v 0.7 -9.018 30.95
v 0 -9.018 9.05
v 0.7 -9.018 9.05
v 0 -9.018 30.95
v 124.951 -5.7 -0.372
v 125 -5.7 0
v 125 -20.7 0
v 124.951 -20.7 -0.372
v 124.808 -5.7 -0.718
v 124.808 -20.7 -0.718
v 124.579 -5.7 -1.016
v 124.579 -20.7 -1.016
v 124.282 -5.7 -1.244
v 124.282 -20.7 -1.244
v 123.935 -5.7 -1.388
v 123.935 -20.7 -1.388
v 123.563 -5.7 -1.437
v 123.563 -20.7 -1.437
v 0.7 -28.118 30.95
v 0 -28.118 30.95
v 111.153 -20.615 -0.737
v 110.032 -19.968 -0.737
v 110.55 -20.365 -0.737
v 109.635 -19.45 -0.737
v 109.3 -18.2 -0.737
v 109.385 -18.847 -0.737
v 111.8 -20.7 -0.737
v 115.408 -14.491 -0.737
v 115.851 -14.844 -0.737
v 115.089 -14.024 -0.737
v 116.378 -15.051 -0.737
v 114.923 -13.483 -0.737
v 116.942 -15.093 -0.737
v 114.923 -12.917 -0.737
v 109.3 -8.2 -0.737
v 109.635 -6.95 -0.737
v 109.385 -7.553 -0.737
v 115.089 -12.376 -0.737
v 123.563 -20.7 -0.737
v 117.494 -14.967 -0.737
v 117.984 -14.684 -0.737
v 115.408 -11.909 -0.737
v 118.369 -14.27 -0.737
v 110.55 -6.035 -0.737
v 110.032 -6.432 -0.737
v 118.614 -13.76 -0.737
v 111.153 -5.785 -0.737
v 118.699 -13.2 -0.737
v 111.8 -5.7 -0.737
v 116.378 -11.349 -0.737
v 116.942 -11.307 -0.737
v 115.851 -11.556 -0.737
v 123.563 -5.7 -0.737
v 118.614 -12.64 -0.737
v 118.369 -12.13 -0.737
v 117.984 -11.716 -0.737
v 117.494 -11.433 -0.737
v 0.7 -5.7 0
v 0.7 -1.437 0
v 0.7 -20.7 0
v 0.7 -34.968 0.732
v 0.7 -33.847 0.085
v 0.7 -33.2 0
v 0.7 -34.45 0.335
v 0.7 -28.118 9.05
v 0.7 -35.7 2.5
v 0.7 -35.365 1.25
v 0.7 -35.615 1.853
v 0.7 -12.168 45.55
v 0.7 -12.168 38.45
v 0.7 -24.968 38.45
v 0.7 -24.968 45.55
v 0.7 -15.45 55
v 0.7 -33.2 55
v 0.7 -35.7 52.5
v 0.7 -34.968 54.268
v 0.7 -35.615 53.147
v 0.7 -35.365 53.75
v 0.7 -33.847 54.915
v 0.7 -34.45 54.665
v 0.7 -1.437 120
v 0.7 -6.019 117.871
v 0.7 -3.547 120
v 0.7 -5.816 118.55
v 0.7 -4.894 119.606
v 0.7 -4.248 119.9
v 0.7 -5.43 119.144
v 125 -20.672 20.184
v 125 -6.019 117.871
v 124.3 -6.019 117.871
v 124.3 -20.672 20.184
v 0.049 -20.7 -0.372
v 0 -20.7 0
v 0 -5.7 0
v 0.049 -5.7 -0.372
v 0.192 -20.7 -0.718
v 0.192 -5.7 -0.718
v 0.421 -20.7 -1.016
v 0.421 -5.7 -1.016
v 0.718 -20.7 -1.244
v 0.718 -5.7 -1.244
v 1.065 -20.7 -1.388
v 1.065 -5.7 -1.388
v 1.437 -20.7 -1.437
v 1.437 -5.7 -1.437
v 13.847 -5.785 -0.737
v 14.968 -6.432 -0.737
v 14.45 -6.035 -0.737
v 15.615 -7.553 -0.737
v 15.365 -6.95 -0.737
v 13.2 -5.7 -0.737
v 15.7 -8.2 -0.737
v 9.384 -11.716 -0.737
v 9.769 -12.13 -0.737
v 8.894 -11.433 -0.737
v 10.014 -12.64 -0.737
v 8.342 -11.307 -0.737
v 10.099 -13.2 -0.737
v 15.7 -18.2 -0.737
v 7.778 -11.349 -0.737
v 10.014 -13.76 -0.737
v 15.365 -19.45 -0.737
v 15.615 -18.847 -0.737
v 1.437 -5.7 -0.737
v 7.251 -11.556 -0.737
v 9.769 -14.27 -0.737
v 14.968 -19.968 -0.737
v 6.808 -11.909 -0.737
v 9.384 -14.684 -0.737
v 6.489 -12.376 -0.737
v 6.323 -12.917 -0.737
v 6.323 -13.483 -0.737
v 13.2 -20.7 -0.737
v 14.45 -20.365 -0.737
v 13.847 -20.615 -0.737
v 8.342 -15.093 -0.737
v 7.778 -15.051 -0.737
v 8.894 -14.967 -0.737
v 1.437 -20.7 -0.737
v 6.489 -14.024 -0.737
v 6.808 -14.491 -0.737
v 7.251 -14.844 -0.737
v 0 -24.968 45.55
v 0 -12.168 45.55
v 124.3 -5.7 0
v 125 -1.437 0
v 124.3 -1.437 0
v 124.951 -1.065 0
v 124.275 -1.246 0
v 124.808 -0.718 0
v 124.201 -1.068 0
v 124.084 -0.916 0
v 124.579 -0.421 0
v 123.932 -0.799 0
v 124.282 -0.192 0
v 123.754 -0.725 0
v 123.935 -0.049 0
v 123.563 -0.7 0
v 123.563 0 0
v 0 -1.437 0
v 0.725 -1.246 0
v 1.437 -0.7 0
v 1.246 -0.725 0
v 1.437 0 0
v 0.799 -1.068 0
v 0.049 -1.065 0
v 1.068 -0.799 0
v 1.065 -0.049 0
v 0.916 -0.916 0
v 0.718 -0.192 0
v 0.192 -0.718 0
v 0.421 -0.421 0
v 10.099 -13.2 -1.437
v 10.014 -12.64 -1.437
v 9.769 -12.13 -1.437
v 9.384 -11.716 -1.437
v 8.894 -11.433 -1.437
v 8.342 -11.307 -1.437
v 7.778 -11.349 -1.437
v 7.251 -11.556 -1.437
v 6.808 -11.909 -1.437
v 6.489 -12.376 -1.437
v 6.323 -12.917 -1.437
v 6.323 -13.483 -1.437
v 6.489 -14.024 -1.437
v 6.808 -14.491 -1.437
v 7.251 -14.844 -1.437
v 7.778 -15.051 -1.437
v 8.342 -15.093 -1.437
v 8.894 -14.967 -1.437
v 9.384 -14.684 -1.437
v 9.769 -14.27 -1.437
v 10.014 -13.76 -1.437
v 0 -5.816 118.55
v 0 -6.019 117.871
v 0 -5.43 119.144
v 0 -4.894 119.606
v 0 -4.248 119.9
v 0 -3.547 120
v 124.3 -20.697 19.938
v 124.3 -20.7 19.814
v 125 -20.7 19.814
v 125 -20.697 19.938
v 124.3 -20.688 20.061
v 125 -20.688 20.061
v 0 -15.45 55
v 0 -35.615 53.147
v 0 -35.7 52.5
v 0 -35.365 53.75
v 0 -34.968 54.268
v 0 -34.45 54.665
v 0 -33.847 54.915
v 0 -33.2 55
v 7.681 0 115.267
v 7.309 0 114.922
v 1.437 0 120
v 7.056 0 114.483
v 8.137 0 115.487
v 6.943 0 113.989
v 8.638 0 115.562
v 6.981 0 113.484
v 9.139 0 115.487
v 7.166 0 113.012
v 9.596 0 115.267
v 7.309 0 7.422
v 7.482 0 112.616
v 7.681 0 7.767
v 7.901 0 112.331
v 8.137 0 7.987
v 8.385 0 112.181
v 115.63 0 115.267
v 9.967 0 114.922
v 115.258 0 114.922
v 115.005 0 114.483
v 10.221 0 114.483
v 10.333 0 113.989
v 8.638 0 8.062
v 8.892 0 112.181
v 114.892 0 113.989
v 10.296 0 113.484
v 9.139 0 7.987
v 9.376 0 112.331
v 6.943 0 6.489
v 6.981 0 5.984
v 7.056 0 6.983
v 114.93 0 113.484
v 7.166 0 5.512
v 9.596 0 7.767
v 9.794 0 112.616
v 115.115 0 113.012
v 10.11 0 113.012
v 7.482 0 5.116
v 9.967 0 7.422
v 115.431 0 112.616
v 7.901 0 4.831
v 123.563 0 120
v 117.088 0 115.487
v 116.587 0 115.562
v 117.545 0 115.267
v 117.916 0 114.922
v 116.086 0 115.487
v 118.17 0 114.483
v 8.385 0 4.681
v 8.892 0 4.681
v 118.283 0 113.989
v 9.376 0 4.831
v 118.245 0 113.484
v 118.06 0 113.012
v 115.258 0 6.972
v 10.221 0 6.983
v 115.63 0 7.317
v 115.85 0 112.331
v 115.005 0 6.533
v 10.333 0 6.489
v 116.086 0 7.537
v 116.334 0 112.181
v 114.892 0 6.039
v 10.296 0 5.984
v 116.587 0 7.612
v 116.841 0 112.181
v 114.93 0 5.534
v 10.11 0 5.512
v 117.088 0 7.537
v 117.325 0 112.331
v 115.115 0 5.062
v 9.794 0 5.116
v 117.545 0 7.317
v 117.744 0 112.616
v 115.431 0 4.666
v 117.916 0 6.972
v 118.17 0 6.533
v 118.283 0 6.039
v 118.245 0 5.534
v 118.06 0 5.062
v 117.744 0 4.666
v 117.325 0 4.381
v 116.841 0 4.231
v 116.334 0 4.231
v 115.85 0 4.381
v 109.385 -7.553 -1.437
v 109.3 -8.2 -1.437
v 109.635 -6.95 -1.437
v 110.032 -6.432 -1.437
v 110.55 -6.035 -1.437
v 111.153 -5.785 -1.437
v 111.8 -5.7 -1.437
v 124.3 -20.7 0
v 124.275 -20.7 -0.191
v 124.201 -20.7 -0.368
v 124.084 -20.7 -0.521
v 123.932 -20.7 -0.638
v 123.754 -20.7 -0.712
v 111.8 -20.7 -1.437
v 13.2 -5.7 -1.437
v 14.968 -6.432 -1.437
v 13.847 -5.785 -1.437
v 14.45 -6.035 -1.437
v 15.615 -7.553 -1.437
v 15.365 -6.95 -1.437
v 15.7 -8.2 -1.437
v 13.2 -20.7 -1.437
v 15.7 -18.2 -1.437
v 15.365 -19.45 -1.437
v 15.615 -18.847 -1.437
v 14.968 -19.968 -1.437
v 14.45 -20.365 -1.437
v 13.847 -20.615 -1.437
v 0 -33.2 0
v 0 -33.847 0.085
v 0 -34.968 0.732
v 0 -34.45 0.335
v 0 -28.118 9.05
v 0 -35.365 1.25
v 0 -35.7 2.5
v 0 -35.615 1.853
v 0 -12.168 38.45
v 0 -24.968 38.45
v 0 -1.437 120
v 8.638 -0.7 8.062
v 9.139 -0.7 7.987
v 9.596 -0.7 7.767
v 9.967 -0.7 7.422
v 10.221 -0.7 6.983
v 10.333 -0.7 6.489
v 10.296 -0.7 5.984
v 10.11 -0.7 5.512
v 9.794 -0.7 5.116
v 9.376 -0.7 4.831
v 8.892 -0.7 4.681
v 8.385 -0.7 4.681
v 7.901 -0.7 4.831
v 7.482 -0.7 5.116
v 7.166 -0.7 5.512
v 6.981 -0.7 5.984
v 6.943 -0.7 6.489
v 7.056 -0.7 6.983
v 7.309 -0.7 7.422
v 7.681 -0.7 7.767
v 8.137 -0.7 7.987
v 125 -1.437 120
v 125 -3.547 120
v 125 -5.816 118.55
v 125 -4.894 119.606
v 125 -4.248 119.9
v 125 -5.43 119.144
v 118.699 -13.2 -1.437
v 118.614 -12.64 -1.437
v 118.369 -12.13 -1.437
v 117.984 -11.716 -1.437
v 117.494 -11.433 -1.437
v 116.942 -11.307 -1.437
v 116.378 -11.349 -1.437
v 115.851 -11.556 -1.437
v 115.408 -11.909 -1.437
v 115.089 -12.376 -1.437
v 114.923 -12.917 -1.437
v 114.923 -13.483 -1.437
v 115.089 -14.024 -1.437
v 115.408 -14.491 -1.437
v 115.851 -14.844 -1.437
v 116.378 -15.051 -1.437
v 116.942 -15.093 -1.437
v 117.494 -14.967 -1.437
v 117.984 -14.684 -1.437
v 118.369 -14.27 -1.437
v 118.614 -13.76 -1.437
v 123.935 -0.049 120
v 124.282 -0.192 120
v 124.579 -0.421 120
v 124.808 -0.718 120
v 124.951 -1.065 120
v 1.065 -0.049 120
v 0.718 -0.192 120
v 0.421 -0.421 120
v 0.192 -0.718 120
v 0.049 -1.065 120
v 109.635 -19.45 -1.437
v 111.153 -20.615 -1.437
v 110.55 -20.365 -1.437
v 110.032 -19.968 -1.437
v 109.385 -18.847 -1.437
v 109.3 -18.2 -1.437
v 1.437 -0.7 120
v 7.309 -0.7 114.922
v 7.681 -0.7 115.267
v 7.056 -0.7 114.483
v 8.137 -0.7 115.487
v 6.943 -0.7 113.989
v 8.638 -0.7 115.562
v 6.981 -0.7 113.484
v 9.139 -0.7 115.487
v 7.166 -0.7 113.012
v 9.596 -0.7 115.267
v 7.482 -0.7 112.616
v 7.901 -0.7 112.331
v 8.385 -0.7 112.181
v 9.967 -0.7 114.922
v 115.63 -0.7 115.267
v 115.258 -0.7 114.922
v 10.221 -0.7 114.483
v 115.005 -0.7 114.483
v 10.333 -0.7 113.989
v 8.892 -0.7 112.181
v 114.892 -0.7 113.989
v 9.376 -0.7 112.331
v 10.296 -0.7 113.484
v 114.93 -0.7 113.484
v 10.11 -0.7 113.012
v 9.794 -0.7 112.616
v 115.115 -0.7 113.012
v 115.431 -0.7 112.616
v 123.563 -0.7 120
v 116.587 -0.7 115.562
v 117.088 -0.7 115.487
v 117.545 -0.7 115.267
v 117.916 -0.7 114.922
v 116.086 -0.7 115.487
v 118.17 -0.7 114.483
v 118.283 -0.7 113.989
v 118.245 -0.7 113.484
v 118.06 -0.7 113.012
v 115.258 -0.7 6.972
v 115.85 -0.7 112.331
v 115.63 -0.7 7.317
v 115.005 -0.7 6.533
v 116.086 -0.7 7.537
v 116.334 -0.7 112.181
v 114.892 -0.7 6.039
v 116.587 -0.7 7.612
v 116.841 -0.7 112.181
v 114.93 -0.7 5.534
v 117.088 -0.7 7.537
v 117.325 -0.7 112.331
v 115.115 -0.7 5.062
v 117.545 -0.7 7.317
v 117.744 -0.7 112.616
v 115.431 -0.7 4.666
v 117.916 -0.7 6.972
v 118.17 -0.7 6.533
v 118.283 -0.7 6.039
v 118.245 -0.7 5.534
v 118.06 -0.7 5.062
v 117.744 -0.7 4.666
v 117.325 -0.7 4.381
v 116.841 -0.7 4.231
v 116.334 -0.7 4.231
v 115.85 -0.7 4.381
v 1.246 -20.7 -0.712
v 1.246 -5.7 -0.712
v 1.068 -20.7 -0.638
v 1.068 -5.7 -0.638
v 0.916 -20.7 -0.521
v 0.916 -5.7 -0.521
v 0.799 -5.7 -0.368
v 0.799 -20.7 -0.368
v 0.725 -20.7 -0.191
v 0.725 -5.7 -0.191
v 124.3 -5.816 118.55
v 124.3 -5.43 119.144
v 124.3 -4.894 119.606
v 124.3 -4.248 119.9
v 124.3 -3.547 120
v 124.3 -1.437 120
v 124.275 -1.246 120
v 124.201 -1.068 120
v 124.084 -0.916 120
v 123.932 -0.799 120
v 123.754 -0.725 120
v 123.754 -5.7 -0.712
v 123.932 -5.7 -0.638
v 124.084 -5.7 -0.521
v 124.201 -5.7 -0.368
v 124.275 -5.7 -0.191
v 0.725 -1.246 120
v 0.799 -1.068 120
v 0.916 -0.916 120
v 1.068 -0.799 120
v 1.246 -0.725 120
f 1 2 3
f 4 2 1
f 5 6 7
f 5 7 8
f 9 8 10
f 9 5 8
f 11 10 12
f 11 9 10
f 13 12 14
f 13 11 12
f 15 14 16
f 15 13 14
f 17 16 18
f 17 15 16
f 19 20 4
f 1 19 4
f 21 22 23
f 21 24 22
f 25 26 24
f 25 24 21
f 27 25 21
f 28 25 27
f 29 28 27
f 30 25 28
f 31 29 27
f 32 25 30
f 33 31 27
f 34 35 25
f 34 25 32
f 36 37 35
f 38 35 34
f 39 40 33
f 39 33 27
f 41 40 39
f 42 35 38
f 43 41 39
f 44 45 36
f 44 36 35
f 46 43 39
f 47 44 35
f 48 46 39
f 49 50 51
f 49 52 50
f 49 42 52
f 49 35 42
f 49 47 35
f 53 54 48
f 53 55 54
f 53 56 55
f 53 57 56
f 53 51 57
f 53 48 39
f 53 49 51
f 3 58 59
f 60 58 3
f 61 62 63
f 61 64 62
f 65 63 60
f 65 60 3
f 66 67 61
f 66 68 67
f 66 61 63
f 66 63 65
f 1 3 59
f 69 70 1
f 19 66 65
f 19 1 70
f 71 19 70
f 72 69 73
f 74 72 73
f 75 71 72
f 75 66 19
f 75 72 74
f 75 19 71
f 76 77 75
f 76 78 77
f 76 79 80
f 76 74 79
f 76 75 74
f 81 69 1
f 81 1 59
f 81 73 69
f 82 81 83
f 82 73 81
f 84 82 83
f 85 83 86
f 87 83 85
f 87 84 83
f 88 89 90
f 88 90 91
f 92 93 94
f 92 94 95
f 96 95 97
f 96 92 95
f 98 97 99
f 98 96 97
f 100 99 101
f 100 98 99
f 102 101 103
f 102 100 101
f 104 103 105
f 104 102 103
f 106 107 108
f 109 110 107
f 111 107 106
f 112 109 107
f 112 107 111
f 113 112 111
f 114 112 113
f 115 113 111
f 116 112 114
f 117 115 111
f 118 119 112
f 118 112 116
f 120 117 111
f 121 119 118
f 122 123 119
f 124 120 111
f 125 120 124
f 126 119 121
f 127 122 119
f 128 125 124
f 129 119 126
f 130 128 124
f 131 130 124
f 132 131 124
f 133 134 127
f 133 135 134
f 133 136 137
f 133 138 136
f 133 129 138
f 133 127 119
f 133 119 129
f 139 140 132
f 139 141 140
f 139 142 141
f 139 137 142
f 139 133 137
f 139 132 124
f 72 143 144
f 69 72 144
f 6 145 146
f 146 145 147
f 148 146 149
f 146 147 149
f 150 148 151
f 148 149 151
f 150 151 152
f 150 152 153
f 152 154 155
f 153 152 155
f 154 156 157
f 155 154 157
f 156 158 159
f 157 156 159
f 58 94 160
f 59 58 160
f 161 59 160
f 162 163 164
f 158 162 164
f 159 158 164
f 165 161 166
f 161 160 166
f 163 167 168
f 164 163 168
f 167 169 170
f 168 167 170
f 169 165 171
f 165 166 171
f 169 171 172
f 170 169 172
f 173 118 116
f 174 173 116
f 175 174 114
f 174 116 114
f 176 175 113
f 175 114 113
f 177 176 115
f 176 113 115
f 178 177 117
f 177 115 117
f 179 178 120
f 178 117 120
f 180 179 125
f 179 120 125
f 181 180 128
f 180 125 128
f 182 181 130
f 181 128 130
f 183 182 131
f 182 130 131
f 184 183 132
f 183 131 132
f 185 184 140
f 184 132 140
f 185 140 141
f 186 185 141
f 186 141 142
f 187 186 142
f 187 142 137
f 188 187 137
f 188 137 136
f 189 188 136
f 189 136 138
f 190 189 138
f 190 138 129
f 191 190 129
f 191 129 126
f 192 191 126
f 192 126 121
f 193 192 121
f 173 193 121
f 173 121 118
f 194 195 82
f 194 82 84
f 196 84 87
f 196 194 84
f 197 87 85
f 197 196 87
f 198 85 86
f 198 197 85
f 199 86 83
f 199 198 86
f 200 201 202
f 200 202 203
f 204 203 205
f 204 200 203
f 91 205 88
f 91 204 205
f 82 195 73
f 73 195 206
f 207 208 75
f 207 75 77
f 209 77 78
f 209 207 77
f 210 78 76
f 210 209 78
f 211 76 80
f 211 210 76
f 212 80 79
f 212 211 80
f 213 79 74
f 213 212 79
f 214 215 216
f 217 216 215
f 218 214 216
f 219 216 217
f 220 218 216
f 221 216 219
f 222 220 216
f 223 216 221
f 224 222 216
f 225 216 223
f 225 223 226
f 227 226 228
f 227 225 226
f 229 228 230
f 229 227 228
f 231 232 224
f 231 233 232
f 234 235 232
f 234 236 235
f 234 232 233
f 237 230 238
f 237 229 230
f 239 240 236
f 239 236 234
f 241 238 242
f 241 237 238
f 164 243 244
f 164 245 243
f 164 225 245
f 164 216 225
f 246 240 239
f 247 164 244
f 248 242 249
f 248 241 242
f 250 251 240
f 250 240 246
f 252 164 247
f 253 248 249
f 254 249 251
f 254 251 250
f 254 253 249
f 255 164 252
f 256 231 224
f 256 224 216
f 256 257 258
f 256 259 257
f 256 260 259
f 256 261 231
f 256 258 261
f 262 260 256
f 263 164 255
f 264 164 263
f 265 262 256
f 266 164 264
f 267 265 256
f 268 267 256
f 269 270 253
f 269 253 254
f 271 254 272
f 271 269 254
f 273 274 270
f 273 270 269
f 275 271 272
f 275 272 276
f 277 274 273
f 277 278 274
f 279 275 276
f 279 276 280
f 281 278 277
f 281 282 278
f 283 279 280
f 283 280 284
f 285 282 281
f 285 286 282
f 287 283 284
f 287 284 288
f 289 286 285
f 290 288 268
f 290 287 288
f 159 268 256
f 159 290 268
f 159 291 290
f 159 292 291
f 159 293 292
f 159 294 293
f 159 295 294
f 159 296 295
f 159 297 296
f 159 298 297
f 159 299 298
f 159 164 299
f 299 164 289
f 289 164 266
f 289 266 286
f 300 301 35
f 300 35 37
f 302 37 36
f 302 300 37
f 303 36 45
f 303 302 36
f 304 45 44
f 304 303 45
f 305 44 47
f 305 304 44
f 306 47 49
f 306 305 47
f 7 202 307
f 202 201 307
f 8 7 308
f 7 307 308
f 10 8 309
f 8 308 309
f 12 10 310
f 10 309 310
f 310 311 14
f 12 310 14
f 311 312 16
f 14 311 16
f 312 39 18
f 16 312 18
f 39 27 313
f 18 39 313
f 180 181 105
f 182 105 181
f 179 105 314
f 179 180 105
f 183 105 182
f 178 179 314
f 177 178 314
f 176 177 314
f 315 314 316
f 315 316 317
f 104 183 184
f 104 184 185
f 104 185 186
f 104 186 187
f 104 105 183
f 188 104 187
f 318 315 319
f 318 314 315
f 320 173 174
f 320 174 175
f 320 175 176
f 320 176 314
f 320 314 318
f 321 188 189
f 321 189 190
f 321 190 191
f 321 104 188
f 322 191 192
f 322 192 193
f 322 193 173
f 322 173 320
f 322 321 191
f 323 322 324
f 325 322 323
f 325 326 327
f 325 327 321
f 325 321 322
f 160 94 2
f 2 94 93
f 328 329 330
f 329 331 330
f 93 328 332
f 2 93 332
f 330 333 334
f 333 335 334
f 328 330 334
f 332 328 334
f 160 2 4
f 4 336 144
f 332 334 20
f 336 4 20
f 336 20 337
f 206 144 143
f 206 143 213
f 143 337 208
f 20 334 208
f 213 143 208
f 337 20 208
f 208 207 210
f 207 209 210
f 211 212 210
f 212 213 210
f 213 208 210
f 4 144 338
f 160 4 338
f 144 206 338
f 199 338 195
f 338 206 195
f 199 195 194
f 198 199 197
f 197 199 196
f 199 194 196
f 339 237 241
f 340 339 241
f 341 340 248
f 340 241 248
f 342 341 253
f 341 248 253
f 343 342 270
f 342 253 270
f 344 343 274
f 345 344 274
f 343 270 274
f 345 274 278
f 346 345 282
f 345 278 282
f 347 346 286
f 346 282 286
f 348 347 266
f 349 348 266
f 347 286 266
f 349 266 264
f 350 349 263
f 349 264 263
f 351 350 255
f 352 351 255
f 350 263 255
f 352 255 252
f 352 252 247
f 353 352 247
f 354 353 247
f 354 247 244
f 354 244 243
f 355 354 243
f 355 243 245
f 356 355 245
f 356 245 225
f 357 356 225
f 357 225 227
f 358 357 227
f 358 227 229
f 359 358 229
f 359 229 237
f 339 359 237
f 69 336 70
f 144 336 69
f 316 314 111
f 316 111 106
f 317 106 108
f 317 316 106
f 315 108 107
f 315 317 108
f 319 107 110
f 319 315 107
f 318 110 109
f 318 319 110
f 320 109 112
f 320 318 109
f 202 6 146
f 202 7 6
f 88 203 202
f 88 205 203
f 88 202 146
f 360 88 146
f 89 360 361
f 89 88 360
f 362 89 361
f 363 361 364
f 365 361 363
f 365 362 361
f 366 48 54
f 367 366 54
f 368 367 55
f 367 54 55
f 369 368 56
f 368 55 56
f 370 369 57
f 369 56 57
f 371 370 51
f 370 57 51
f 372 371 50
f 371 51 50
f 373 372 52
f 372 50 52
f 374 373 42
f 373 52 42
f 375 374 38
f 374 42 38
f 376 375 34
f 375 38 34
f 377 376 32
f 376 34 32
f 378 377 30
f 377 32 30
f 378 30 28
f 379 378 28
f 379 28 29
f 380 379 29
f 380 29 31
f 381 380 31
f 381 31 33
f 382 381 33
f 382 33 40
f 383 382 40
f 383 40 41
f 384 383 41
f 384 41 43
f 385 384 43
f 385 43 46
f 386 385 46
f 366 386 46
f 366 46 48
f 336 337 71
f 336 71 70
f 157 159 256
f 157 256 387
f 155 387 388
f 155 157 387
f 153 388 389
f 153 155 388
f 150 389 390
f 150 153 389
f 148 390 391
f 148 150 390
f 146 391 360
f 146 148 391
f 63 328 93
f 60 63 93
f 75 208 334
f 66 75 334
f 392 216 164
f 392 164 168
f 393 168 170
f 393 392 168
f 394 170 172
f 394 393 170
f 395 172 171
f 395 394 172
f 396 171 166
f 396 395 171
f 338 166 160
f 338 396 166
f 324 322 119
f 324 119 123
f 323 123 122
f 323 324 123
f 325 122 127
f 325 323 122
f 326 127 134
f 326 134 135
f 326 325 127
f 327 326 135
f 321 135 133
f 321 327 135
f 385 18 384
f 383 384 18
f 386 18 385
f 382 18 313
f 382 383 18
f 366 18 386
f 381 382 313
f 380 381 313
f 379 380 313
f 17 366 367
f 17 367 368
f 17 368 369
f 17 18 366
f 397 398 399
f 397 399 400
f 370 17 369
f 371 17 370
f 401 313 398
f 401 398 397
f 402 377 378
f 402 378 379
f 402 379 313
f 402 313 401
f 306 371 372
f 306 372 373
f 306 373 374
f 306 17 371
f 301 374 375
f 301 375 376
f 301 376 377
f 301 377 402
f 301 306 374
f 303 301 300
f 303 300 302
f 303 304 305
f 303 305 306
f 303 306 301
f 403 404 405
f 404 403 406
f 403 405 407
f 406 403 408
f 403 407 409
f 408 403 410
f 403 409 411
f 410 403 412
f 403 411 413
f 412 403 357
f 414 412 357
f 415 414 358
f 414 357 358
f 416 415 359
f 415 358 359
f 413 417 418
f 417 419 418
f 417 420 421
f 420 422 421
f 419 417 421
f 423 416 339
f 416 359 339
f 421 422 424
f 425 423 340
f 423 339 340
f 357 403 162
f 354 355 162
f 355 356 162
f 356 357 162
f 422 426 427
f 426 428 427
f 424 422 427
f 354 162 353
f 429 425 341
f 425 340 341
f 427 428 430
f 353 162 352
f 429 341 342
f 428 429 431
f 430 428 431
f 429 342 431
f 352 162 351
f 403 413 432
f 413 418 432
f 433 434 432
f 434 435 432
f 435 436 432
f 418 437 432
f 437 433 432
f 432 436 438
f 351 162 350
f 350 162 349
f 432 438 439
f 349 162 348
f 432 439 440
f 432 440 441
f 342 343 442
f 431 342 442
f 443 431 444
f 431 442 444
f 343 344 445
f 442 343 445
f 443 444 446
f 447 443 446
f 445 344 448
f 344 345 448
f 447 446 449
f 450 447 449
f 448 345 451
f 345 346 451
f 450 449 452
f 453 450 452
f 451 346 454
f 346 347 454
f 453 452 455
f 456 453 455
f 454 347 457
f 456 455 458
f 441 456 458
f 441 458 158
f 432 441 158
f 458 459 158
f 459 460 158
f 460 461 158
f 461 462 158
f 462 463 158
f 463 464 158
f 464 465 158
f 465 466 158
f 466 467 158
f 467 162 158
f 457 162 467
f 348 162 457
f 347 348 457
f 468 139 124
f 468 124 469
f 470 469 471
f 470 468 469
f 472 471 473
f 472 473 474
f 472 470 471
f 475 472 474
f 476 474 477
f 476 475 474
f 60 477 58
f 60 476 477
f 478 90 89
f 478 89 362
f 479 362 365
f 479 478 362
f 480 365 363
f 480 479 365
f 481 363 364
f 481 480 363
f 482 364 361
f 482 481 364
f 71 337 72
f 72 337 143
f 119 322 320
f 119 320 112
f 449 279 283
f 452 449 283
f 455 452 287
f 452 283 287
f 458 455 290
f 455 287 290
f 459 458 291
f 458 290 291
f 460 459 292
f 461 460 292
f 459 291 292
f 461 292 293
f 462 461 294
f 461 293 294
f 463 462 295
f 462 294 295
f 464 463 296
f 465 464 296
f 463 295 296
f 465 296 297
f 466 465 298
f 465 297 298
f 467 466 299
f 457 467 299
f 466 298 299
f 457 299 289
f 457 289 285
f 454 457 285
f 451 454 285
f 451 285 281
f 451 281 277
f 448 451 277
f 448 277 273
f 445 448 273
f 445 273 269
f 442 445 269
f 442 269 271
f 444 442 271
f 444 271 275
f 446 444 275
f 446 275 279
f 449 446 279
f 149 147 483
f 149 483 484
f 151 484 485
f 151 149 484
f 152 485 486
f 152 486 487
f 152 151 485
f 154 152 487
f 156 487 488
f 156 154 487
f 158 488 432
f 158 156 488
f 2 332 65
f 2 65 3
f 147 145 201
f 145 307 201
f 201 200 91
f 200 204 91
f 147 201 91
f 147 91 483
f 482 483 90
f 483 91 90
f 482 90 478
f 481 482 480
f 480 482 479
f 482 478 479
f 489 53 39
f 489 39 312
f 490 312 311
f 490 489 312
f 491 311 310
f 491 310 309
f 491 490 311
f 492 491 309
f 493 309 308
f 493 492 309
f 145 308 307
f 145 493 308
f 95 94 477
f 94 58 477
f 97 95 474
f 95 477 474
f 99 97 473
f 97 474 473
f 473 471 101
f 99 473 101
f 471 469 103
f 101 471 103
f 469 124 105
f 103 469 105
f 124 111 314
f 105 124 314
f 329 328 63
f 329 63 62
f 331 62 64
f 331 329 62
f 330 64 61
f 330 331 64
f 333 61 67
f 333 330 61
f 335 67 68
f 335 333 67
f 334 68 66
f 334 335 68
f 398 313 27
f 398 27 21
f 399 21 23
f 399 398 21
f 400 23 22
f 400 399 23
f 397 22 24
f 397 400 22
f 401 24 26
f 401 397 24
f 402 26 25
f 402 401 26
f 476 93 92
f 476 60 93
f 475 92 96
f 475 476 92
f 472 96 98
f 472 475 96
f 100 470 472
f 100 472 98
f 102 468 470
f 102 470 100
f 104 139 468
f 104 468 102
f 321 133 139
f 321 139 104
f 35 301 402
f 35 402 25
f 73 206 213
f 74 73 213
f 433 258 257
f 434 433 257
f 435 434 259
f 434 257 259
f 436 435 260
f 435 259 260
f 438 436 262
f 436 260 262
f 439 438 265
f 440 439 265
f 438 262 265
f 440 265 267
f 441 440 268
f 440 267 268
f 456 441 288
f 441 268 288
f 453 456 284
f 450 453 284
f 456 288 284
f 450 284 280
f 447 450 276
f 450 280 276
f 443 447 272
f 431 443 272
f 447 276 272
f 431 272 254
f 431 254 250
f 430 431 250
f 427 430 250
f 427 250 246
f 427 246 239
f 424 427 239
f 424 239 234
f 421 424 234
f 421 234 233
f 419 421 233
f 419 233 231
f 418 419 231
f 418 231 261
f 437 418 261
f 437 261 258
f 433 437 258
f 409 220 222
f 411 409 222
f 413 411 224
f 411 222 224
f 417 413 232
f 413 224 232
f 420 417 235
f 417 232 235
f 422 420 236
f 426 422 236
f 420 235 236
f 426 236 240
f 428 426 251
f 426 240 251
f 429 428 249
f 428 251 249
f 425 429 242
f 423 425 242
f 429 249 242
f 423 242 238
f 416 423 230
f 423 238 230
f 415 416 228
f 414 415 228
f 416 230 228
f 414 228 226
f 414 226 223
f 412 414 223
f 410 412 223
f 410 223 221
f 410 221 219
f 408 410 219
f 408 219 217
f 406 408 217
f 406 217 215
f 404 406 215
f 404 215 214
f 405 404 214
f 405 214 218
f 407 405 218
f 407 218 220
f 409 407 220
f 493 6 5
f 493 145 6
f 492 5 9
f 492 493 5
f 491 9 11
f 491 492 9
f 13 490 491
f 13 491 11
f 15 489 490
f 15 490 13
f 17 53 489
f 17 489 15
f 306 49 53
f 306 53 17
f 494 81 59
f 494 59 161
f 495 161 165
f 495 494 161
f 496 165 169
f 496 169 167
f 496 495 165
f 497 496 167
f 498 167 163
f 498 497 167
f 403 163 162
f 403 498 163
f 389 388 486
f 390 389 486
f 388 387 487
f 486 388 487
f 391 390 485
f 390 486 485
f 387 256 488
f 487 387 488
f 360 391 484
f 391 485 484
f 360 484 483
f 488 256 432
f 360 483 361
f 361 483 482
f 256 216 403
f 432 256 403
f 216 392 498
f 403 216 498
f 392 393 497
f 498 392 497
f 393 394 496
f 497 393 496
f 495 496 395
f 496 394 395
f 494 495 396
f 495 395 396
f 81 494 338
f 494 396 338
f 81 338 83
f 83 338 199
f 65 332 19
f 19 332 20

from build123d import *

# Parameters (mm, degrees)
SKETCH1_W                    = 125
SKETCH1_H                    = 120
BASE_FLANGE1_DEPTH           = 0.7
EDGE_FLANGE1_STRIP_W         = 4.2732
EDGE_FLANGE1_STRIP_H         = 0.7
EDGE_FLANGE1_STRIP_CUT_DEPTH = 120
EDGE_FLANGE1_DEPTH           = 120
EDGE_FLANGE1_FLAT_DEPTH      = 0.7
EDGE_FLANGE2_STRIP_W         = 4.2732
EDGE_FLANGE2_STRIP_H         = 0.7
EDGE_FLANGE2_STRIP_CUT_DEPTH = 120
EDGE_FLANGE2_DEPTH           = 120
EDGE_FLANGE2_FLAT_DEPTH      = 0.7
SKETCH10_R                   = 1.7
CUT_EXTRUDE1_DEPTH           = 10
EDGE_FLANGE3_DEPTH           = 15
EDGE_FLANGE4_DEPTH           = 15
F_6_CLEARANCE_HOLE1_D        = 3.7973
F_6_CLEARANCE_HOLE1_DEPTH    = 10
F_6_CLEARANCE_HOLE1_TIP      = 1.140824014
BREAK_CORNER1_START          = -1
BREAK_CORNER1_DEPTH          = 127
BREAK_CORNER1_START_2        = 123.5634
BREAK_CORNER1_2_DEPTH        = 2.4366
BREAK_CORNER1_START_3        = -2
BREAK_CORNER1_3_DEPTH        = 2
SKETCH23_W                   = 21.9
SKETCH23_H                   = 19.1
SKETCH23_W_2                 = 7.1
SKETCH23_H_2                 = 12.8
CUT_EXTRUDE2_DEPTH           = 0.7


with BuildPart() as part:
    # Base-Flange1: sheet metal written as solids
    # Sketch1 → Base-Flange1 (new body)
    with BuildSketch(Plane(origin=(0, 0, 0), x_dir=(1, 0, 0), z_dir=(0, 1, 0))):
        with Locations((62.5, -60)):
            Rectangle(SKETCH1_W, SKETCH1_H)
    extrude(amount=-BASE_FLANGE1_DEPTH)

    # Edge-Flange1: sheet metal written as solids
    # Edge-Flange1 strip (on a plane across the edge) → Edge-Flange1 strip cut (cut)
    with BuildSketch(Plane(origin=(125, -0.7, 0), x_dir=(-1, 0, 0), z_dir=(0, 0, 1))):
        with Locations((-0.7, -0.35)):
            Rectangle(EDGE_FLANGE1_STRIP_W, EDGE_FLANGE1_STRIP_H)
    extrude(amount=EDGE_FLANGE1_STRIP_CUT_DEPTH, mode=Mode.SUBTRACT)

    # Edge-Flange1 bend section (on a plane across the edge) → Edge-Flange1 (add)
    with BuildSketch(Plane(origin=(125, -0.7, 0), x_dir=(-1, 0, 0), z_dir=(0, 0, 1))):
        with BuildLine():
            Line((0, 0.7366), (0.7, 0.7366))
            ThreePointArc((0.7, 0.7366), (0.915745145, 0.215745145), (1.4366, 0))
            Line((1.4366, 0), (1.4366, -0.7))
            ThreePointArc((1.4366, -0.7), (0.420770398, -0.279229602), (0, 0.7366))
        make_face()
    extrude(amount=EDGE_FLANGE1_DEPTH)

    # Edge-Flange1 profile (on flange) → Edge-Flange1 flat (add)
    with BuildSketch(Plane(origin=(125, -0.7, 0), x_dir=(0, 0, 1), z_dir=(1, 0, 0))):
        Polygon((120, 0.7366), (120, 5), (20, 20), (0, 20), (0, 0.7366), align=None)
    extrude(amount=-EDGE_FLANGE1_FLAT_DEPTH)

    # Edge-Flange2: sheet metal written as solids
    # Edge-Flange2 strip (on a plane across the edge) → Edge-Flange2 strip cut (cut)
    with BuildSketch(Plane(origin=(0, -0.7, 120), x_dir=(1, 0, 0), z_dir=(0, 0, -1))):
        with Locations((-0.7, -0.35)):
            Rectangle(EDGE_FLANGE2_STRIP_W, EDGE_FLANGE2_STRIP_H)
    extrude(amount=EDGE_FLANGE2_STRIP_CUT_DEPTH, mode=Mode.SUBTRACT)

    # Edge-Flange2 bend section (on a plane across the edge) → Edge-Flange2 (add)
    with BuildSketch(Plane(origin=(0, -0.7, 120), x_dir=(1, 0, 0), z_dir=(0, 0, -1))):
        with BuildLine():
            Line((0, 0.7366), (0.7, 0.7366))
            ThreePointArc((0.7, 0.7366), (0.915745145, 0.215745145), (1.4366, 0))
            Line((1.4366, 0), (1.4366, -0.7))
            ThreePointArc((1.4366, -0.7), (0.420770398, -0.279229602), (0, 0.7366))
        make_face()
    extrude(amount=EDGE_FLANGE2_DEPTH)

    # Edge-Flange2 profile (on flange) → Edge-Flange2 flat (add)
    with BuildSketch(Plane(origin=(0, -0.7, 0), x_dir=(0, 0, 1), z_dir=(1, 0, 0))):
        Polygon((120, 0.7366), (120, 5), (55, 14.75), (55, 35), (0, 35), (0, 20), (0, 0.7366), align=None)
    extrude(amount=EDGE_FLANGE2_FLAT_DEPTH)

    # Sketch10 → Cut-Extrude1 (cut)
    with BuildSketch(Plane(origin=(0, 0, 0), x_dir=(1, 0, 0), z_dir=(0, 1, 0))):
        with Locations(Location((116.587265025, -113.862265027, 0), (0, 0, 270))):
            Circle(SKETCH10_R)
        with Locations(Location((116.587265025, -5.912265027, 0), (0, 0, 270))):
            Circle(SKETCH10_R)
        with Locations(Location((8.638202963, -6.362265027, 0), (0, 0, 270))):
            Circle(SKETCH10_R)
        with Locations(Location((8.638202963, -113.862265027, 0), (0, 0, 270))):
            Circle(SKETCH10_R)
    extrude(amount=-CUT_EXTRUDE1_DEPTH, mode=Mode.SUBTRACT)

    # Edge-Flange3: sheet metal written as solids
    # Edge-Flange3 section (on a plane across the edge) → Edge-Flange3 (add)
    with BuildSketch(Plane(origin=(124.3, -5.7, -0.7366), x_dir=(0, 0, 1), z_dir=(0, -1, 0))):
        with BuildLine():
            Line((-0.7, 0.7366), (-0.7, 15))
            Line((-0.7, 15), (0, 15))
            Line((0, 15), (0, 0.7366))
            ThreePointArc((0, 0.7366), (0.215745145, 0.215745145), (0.7366, 0))
            Line((0.7366, 0), (0.7366, -0.7))
            ThreePointArc((0.7366, -0.7), (-0.279229602, -0.279229602), (-0.7, 0.7366))
        make_face()
    extrude(amount=EDGE_FLANGE3_DEPTH)

    # Edge-Flange4: sheet metal written as solids
    # Edge-Flange4 section (on a plane across the edge) → Edge-Flange4 (add)
    with BuildSketch(Plane(origin=(0.7, -20.7, -0.7366), x_dir=(0, 0, 1), z_dir=(0, 1, 0))):
        with BuildLine():
            Line((-0.7, 0.7366), (-0.7, 15))
            Line((-0.7, 15), (0, 15))
            Line((0, 15), (0, 0.7366))
            ThreePointArc((0, 0.7366), (0.215745145, 0.215745145), (0.7366, 0))
            Line((0.7366, 0), (0.7366, -0.7))
            ThreePointArc((0.7366, -0.7), (-0.279229602, -0.279229602), (-0.7, 0.7366))
        make_face()
    extrude(amount=EDGE_FLANGE4_DEPTH)

    # #6 Clearance Hole1
    with Locations(Plane(origin=(0, 0, -1.4366), x_dir=(-1, 0, 0), z_dir=(0, 0, -1))):
        with Locations((-116.8, -13.2), (-8.2, -13.2)):
            Hole(F_6_CLEARANCE_HOLE1_D / 2, depth=F_6_CLEARANCE_HOLE1_DEPTH)
            with Locations((0, 0, -(F_6_CLEARANCE_HOLE1_DEPTH + F_6_CLEARANCE_HOLE1_TIP / 2))):  # 118° drill point
                Cone(0, F_6_CLEARANCE_HOLE1_D / 2, F_6_CLEARANCE_HOLE1_TIP, mode=Mode.SUBTRACT)

    # Break-Corner1: read off the stored shape, not the designer's step
    # Break-Corner1 outline → Break-Corner1 (cut)
    with BuildSketch(Plane.YZ.offset(BREAK_CORNER1_START)):
        with BuildLine():
            ThreePointArc((-6.01937233, 117.870851132), (-5.178422292, 119.394350526), (-3.547031448, 120))
            Line((-3.547031448, 120), (-5.7, 120))
            Line((-5.7, 120), (-6.01937233, 117.870851132))
        make_face()
        with BuildLine():
            ThreePointArc((-35.7, 52.5), (-34.967766953, 54.267766953), (-33.2, 55))
            Line((-33.2, 55), (-35.7, 55))
            Line((-35.7, 55), (-35.7, 52.5))
        make_face()
        with BuildLine():
            ThreePointArc((-33.2, 0), (-34.967766953, 0.732233047), (-35.7, 2.5))
            Line((-35.7, 2.5), (-35.7, 0))
            Line((-35.7, 0), (-33.2, 0))
        make_face()
    extrude(amount=BREAK_CORNER1_DEPTH, mode=Mode.SUBTRACT)

    # Break-Corner1 2 outline → Break-Corner1 2 (cut)
    with BuildSketch(Plane.YZ.offset(BREAK_CORNER1_START_2)):
        with BuildLine():
            ThreePointArc((-20.7, 19.813542987), (-20.693075631, 19.999483561), (-20.672340882, 20.184394119))
            Line((-20.672340882, 20.184394119), (-20.7, 20))
            Line((-20.7, 20), (-20.7, 19.813542987))
        make_face()
    extrude(amount=BREAK_CORNER1_2_DEPTH, mode=Mode.SUBTRACT)

    # Break-Corner1 3 outline → Break-Corner1 3 (cut)
    with BuildSketch(Plane.XY.offset(BREAK_CORNER1_START_3)):
        with BuildLine():
            ThreePointArc((13.2, -5.7), (14.967766953, -6.432233047), (15.7, -8.2))
            Line((15.7, -8.2), (15.7, -5.7))
            Line((15.7, -5.7), (13.2, -5.7))
        make_face()
        with BuildLine():
            ThreePointArc((15.7, -18.2), (14.967766953, -19.967766953), (13.2, -20.7))
            Line((13.2, -20.7), (15.7, -20.7))
            Line((15.7, -20.7), (15.7, -18.2))
        make_face()
        with BuildLine():
            ThreePointArc((111.8, -20.7), (110.032233047, -19.967766953), (109.3, -18.2))
            Line((109.3, -18.2), (109.3, -20.7))
            Line((109.3, -20.7), (111.8, -20.7))
        make_face()
        with BuildLine():
            ThreePointArc((109.3, -8.2), (110.032233047, -6.432233047), (111.8, -5.7))
            Line((111.8, -5.7), (109.3, -5.7))
            Line((109.3, -5.7), (109.3, -8.2))
        make_face()
    extrude(amount=BREAK_CORNER1_3_DEPTH, mode=Mode.SUBTRACT)

    # Sketch23 → Cut-Extrude2 (cut)
    with BuildSketch(Plane.ZY):
        with Locations((20, -18.5683)):
            Rectangle(SKETCH23_W, SKETCH23_H)
        with Locations((42, -18.5683)):
            Rectangle(SKETCH23_W_2, SKETCH23_H_2)
    extrude(amount=-CUT_EXTRUDE2_DEPTH, mode=Mode.SUBTRACT)


solid = part.part
